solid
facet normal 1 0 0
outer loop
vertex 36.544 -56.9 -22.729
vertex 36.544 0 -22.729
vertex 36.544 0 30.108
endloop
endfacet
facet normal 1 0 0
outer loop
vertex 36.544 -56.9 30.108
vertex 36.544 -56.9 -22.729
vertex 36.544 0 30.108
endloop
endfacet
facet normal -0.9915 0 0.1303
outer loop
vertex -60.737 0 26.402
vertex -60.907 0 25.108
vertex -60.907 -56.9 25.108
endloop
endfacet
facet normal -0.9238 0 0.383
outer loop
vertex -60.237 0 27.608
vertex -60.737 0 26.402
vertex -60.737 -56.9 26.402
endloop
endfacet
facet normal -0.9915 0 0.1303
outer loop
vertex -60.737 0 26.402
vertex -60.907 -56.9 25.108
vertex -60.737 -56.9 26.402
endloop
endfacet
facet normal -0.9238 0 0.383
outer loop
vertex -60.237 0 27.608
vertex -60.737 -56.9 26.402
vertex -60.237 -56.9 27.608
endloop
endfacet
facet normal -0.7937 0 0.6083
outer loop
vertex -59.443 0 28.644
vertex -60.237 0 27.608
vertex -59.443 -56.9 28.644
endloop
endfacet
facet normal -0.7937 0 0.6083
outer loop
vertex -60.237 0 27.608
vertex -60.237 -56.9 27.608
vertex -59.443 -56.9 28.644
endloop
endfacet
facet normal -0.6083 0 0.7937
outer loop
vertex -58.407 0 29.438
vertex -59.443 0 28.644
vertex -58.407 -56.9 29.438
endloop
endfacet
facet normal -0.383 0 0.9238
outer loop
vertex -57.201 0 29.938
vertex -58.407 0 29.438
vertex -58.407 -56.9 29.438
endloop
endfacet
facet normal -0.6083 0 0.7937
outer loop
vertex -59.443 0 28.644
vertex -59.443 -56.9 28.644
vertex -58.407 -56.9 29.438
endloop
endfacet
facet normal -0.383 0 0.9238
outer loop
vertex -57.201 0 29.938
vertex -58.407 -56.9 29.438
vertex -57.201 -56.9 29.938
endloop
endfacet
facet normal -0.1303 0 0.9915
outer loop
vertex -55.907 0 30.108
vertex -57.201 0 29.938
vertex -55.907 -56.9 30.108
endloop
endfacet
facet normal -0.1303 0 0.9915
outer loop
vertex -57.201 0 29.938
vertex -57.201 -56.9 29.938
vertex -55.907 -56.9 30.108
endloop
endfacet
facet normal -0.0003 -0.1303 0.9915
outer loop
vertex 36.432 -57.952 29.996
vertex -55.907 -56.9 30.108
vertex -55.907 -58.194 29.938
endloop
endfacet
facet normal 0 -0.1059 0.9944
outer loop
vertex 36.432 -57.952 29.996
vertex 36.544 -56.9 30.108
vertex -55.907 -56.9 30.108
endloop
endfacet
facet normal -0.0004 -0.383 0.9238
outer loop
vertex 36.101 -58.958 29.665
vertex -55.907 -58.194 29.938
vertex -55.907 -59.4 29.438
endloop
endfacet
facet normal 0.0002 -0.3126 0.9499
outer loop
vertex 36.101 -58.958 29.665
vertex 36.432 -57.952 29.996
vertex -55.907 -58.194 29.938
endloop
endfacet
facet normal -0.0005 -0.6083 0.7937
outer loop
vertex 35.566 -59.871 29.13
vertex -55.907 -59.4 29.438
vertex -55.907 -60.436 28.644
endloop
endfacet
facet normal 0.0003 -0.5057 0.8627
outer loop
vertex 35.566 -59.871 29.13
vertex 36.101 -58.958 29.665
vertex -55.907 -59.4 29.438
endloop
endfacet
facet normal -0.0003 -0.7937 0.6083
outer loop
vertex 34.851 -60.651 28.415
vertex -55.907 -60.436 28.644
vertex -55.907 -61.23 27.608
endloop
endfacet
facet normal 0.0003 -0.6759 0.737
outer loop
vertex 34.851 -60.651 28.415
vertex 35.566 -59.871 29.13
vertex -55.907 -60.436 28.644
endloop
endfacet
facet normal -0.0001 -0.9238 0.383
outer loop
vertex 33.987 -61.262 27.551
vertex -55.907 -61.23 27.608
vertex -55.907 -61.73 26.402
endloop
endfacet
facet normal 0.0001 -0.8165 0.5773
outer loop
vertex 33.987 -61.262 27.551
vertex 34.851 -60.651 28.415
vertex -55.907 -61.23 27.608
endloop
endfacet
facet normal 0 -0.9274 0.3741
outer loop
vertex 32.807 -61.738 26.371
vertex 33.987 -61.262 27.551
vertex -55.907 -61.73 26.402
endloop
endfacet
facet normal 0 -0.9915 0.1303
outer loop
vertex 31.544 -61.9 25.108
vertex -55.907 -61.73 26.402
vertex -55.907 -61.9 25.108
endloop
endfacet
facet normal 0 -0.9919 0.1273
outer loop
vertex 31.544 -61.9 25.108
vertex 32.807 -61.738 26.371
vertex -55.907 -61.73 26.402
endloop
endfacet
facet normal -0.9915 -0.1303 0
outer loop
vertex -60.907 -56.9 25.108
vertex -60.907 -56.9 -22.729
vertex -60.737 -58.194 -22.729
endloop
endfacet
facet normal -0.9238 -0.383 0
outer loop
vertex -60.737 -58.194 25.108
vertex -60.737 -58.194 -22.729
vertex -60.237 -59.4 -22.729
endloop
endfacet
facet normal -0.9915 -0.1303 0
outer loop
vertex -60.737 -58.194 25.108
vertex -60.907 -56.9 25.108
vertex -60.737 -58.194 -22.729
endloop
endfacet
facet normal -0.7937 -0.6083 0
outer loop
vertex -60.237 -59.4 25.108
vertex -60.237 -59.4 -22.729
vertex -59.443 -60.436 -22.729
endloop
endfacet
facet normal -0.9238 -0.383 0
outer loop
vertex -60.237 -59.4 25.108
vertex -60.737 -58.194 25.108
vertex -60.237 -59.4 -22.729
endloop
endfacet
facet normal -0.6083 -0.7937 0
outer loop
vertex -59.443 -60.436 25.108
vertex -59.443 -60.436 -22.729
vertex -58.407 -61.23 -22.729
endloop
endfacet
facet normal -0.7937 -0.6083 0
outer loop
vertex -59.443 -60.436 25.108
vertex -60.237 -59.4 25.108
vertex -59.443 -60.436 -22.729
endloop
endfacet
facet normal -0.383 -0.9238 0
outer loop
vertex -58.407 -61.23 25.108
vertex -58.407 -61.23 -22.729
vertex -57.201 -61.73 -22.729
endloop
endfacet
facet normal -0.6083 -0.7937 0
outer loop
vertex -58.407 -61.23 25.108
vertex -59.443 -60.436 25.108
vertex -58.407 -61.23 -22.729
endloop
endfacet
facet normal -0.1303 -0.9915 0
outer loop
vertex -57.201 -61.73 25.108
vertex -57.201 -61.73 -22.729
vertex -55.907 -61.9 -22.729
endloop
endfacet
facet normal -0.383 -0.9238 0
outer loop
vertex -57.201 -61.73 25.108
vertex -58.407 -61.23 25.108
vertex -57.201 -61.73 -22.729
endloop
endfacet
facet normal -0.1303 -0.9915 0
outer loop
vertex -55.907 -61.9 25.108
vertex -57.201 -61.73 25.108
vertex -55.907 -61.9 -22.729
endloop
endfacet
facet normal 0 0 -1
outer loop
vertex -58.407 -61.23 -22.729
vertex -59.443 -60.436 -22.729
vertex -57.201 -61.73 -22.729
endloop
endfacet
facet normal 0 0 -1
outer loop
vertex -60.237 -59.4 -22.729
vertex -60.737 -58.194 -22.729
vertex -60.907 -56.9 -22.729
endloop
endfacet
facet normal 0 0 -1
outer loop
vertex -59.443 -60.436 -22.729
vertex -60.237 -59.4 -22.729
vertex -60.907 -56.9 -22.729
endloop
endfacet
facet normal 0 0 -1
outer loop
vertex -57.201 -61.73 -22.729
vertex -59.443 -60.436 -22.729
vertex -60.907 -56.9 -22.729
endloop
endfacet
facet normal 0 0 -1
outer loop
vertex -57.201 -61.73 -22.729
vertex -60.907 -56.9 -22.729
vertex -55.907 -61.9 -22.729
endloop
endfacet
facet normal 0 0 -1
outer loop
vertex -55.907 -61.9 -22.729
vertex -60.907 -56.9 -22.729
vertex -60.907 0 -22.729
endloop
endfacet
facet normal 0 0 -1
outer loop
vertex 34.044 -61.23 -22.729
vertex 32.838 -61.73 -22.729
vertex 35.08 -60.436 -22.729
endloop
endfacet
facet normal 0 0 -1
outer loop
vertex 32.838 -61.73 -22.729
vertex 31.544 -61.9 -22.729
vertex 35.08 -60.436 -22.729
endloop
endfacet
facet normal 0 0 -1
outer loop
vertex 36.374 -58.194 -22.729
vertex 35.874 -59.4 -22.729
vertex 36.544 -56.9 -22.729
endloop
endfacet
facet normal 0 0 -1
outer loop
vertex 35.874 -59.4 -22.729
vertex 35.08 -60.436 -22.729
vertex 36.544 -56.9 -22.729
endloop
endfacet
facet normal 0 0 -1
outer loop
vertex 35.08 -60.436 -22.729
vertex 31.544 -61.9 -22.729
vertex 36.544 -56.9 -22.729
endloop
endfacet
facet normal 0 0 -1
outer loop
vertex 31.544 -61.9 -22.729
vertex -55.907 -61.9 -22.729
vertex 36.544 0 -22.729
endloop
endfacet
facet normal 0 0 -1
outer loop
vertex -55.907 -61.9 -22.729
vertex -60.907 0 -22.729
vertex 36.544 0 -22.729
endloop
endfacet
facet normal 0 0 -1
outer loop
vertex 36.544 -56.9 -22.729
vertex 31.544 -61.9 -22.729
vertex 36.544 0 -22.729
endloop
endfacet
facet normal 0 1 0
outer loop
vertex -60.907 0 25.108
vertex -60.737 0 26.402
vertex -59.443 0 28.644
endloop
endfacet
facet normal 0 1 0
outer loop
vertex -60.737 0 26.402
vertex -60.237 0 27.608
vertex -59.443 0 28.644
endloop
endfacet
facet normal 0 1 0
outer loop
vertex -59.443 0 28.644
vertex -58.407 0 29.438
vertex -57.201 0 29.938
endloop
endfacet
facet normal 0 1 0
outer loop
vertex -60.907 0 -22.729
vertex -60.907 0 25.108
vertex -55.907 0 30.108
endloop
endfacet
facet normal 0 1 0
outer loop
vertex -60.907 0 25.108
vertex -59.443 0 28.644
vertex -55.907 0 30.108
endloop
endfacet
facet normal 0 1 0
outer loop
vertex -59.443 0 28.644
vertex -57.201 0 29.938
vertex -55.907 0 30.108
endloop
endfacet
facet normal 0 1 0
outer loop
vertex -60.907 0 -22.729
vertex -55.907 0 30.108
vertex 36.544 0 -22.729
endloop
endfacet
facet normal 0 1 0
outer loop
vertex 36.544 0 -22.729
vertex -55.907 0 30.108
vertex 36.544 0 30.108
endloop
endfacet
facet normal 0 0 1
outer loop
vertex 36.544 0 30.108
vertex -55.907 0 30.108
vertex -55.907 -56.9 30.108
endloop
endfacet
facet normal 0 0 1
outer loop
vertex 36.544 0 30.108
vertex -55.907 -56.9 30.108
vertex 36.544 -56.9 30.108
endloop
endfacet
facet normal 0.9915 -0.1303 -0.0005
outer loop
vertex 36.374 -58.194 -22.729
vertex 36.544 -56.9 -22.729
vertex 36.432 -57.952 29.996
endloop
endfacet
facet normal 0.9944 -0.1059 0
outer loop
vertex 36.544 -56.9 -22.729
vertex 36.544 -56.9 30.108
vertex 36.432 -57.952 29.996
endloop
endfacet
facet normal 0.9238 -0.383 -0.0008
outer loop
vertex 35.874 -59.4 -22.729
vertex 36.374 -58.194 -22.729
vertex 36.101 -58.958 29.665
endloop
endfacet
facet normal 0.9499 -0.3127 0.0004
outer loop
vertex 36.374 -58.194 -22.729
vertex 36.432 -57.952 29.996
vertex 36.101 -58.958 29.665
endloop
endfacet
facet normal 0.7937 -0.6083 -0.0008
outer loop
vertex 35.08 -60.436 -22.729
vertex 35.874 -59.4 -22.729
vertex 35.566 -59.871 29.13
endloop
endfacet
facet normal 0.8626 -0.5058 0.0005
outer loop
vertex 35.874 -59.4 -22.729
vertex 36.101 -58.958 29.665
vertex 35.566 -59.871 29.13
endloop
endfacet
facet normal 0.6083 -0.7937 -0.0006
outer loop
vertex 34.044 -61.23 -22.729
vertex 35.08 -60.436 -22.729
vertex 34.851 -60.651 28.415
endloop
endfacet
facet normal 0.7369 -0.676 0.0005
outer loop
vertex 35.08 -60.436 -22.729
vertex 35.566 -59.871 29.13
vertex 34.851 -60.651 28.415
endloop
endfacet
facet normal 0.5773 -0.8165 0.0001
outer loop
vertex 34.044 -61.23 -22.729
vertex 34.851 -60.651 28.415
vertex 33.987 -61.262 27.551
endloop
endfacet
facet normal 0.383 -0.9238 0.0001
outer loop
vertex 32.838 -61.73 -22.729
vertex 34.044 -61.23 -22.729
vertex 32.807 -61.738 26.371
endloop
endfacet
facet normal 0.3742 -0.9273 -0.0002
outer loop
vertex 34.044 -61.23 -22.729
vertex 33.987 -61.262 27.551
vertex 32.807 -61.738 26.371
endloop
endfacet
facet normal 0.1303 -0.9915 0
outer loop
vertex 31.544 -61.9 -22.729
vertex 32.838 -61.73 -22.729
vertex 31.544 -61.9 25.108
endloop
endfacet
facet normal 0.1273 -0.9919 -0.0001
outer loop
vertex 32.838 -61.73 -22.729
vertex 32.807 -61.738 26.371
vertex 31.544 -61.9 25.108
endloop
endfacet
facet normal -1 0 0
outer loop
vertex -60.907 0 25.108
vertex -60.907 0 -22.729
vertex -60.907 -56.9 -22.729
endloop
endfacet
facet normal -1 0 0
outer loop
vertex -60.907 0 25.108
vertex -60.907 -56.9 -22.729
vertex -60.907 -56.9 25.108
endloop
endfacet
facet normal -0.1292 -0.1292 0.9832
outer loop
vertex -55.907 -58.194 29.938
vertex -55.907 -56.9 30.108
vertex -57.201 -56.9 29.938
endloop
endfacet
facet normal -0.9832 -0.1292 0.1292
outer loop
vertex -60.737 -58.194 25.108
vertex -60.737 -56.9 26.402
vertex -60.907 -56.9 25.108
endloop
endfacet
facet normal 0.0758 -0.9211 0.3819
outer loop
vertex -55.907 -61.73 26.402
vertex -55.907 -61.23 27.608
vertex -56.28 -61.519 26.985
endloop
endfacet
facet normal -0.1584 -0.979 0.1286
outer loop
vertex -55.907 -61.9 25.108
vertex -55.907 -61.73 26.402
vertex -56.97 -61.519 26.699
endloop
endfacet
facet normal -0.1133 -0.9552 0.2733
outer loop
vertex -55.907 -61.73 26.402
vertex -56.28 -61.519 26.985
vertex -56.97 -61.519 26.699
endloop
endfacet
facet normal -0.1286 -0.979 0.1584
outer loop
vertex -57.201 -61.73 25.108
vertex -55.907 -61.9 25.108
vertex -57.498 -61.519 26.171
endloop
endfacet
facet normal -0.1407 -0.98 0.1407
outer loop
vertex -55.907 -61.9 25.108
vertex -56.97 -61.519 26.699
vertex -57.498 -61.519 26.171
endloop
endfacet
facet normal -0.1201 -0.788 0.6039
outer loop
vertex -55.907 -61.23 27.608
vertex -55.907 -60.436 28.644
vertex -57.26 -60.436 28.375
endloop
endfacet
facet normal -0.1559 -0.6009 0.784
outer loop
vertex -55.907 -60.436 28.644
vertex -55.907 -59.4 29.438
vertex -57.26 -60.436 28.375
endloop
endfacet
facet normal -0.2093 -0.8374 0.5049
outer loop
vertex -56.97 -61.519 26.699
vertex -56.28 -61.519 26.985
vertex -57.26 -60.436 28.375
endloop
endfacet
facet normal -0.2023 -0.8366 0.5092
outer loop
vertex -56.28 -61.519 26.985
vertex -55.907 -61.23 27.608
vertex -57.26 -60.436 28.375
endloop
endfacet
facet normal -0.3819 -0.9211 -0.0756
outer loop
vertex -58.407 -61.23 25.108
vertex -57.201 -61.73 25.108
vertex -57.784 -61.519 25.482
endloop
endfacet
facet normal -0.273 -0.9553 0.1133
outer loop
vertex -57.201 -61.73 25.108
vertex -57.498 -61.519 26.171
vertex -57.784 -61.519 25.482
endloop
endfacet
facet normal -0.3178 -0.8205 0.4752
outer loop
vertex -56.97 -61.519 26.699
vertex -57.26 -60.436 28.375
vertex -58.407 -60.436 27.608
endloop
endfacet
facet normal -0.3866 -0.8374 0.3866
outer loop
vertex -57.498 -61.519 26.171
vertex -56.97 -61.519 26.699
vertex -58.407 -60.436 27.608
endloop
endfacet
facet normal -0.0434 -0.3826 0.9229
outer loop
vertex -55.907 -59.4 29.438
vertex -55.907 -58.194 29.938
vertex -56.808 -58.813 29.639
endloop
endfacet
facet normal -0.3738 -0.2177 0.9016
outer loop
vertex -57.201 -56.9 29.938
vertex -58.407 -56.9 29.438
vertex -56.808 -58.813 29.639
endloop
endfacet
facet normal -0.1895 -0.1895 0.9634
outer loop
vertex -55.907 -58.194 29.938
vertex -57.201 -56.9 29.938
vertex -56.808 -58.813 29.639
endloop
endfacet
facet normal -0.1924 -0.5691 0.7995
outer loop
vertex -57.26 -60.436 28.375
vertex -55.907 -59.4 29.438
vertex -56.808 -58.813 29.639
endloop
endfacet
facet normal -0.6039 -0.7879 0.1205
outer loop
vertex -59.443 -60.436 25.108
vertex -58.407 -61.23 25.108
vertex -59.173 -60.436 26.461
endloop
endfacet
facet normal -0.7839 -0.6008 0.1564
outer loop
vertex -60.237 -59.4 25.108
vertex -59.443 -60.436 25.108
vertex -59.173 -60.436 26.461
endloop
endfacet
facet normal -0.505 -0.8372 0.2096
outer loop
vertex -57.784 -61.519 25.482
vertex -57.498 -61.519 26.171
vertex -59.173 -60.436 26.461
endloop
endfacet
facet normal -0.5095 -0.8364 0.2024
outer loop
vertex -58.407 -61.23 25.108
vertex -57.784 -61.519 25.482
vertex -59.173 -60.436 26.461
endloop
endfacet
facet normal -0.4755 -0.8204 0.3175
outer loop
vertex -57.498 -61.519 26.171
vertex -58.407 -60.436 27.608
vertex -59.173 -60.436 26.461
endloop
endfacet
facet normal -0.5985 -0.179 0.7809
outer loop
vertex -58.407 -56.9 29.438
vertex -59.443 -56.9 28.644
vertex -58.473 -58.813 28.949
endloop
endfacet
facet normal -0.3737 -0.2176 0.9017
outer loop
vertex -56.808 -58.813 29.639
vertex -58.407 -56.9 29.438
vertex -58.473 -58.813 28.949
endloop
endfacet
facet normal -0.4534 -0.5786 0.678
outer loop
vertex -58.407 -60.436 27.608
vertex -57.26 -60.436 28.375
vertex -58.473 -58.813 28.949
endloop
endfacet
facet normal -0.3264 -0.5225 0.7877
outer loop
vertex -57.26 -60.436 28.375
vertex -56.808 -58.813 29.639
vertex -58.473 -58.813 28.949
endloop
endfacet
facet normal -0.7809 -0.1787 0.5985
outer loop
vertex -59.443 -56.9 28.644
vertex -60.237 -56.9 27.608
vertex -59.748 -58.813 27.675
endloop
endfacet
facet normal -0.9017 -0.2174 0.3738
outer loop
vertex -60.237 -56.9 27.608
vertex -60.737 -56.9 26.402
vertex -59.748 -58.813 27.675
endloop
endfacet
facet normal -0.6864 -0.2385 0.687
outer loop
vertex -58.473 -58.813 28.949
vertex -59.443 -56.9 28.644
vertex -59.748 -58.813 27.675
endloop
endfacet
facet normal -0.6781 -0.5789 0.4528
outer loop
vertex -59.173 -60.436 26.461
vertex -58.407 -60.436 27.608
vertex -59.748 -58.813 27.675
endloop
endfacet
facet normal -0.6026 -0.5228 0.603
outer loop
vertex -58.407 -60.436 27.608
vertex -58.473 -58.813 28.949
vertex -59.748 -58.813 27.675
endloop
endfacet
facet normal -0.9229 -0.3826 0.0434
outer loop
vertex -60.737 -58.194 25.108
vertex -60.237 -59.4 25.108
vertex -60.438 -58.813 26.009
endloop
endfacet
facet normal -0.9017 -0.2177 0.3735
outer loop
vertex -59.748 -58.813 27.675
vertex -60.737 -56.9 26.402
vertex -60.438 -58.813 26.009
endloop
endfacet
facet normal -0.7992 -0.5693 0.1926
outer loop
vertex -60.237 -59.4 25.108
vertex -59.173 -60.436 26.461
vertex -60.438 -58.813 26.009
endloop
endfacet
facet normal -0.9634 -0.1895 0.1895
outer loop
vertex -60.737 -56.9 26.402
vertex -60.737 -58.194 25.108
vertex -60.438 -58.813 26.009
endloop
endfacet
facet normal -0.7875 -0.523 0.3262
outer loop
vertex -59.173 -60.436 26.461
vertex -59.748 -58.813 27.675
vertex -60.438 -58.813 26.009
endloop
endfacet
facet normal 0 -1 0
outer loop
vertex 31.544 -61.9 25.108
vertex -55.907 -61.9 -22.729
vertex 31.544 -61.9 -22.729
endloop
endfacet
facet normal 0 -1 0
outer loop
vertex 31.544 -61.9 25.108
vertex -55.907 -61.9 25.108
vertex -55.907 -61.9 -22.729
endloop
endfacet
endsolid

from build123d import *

# Parameters (mm, degrees)
F0_W     = 97.4512062967
F0_H     = 52.8376847506
F1_DEPTH = 61.9
F4_R     = 5


# Not quite as in the source:
# - a feature of the source that left no trace in its solid (it failed there, or was rolled back) is left out


with BuildPart() as f1:
    # F0 (on Front) → F1 (new body)
    with BuildSketch(Plane.XZ):
        with Locations((-12.1814031154, 3.6894287914)):
            Rectangle(F0_W, F0_H)
    extrude(amount=F1_DEPTH)

    # F4
    f4_edges = [f1.edges().sort_by_distance(p)[0] for p in [
        (-60.907006, -30.95, 30.108271),
        (-12.181403, -61.9, 30.108271),
        (-60.907006, -61.9, 3.689429),
        (36.5442, -61.9, 3.689429),
    ]]
    fillet(f4_edges, radius=F4_R)


solid = f1.part
